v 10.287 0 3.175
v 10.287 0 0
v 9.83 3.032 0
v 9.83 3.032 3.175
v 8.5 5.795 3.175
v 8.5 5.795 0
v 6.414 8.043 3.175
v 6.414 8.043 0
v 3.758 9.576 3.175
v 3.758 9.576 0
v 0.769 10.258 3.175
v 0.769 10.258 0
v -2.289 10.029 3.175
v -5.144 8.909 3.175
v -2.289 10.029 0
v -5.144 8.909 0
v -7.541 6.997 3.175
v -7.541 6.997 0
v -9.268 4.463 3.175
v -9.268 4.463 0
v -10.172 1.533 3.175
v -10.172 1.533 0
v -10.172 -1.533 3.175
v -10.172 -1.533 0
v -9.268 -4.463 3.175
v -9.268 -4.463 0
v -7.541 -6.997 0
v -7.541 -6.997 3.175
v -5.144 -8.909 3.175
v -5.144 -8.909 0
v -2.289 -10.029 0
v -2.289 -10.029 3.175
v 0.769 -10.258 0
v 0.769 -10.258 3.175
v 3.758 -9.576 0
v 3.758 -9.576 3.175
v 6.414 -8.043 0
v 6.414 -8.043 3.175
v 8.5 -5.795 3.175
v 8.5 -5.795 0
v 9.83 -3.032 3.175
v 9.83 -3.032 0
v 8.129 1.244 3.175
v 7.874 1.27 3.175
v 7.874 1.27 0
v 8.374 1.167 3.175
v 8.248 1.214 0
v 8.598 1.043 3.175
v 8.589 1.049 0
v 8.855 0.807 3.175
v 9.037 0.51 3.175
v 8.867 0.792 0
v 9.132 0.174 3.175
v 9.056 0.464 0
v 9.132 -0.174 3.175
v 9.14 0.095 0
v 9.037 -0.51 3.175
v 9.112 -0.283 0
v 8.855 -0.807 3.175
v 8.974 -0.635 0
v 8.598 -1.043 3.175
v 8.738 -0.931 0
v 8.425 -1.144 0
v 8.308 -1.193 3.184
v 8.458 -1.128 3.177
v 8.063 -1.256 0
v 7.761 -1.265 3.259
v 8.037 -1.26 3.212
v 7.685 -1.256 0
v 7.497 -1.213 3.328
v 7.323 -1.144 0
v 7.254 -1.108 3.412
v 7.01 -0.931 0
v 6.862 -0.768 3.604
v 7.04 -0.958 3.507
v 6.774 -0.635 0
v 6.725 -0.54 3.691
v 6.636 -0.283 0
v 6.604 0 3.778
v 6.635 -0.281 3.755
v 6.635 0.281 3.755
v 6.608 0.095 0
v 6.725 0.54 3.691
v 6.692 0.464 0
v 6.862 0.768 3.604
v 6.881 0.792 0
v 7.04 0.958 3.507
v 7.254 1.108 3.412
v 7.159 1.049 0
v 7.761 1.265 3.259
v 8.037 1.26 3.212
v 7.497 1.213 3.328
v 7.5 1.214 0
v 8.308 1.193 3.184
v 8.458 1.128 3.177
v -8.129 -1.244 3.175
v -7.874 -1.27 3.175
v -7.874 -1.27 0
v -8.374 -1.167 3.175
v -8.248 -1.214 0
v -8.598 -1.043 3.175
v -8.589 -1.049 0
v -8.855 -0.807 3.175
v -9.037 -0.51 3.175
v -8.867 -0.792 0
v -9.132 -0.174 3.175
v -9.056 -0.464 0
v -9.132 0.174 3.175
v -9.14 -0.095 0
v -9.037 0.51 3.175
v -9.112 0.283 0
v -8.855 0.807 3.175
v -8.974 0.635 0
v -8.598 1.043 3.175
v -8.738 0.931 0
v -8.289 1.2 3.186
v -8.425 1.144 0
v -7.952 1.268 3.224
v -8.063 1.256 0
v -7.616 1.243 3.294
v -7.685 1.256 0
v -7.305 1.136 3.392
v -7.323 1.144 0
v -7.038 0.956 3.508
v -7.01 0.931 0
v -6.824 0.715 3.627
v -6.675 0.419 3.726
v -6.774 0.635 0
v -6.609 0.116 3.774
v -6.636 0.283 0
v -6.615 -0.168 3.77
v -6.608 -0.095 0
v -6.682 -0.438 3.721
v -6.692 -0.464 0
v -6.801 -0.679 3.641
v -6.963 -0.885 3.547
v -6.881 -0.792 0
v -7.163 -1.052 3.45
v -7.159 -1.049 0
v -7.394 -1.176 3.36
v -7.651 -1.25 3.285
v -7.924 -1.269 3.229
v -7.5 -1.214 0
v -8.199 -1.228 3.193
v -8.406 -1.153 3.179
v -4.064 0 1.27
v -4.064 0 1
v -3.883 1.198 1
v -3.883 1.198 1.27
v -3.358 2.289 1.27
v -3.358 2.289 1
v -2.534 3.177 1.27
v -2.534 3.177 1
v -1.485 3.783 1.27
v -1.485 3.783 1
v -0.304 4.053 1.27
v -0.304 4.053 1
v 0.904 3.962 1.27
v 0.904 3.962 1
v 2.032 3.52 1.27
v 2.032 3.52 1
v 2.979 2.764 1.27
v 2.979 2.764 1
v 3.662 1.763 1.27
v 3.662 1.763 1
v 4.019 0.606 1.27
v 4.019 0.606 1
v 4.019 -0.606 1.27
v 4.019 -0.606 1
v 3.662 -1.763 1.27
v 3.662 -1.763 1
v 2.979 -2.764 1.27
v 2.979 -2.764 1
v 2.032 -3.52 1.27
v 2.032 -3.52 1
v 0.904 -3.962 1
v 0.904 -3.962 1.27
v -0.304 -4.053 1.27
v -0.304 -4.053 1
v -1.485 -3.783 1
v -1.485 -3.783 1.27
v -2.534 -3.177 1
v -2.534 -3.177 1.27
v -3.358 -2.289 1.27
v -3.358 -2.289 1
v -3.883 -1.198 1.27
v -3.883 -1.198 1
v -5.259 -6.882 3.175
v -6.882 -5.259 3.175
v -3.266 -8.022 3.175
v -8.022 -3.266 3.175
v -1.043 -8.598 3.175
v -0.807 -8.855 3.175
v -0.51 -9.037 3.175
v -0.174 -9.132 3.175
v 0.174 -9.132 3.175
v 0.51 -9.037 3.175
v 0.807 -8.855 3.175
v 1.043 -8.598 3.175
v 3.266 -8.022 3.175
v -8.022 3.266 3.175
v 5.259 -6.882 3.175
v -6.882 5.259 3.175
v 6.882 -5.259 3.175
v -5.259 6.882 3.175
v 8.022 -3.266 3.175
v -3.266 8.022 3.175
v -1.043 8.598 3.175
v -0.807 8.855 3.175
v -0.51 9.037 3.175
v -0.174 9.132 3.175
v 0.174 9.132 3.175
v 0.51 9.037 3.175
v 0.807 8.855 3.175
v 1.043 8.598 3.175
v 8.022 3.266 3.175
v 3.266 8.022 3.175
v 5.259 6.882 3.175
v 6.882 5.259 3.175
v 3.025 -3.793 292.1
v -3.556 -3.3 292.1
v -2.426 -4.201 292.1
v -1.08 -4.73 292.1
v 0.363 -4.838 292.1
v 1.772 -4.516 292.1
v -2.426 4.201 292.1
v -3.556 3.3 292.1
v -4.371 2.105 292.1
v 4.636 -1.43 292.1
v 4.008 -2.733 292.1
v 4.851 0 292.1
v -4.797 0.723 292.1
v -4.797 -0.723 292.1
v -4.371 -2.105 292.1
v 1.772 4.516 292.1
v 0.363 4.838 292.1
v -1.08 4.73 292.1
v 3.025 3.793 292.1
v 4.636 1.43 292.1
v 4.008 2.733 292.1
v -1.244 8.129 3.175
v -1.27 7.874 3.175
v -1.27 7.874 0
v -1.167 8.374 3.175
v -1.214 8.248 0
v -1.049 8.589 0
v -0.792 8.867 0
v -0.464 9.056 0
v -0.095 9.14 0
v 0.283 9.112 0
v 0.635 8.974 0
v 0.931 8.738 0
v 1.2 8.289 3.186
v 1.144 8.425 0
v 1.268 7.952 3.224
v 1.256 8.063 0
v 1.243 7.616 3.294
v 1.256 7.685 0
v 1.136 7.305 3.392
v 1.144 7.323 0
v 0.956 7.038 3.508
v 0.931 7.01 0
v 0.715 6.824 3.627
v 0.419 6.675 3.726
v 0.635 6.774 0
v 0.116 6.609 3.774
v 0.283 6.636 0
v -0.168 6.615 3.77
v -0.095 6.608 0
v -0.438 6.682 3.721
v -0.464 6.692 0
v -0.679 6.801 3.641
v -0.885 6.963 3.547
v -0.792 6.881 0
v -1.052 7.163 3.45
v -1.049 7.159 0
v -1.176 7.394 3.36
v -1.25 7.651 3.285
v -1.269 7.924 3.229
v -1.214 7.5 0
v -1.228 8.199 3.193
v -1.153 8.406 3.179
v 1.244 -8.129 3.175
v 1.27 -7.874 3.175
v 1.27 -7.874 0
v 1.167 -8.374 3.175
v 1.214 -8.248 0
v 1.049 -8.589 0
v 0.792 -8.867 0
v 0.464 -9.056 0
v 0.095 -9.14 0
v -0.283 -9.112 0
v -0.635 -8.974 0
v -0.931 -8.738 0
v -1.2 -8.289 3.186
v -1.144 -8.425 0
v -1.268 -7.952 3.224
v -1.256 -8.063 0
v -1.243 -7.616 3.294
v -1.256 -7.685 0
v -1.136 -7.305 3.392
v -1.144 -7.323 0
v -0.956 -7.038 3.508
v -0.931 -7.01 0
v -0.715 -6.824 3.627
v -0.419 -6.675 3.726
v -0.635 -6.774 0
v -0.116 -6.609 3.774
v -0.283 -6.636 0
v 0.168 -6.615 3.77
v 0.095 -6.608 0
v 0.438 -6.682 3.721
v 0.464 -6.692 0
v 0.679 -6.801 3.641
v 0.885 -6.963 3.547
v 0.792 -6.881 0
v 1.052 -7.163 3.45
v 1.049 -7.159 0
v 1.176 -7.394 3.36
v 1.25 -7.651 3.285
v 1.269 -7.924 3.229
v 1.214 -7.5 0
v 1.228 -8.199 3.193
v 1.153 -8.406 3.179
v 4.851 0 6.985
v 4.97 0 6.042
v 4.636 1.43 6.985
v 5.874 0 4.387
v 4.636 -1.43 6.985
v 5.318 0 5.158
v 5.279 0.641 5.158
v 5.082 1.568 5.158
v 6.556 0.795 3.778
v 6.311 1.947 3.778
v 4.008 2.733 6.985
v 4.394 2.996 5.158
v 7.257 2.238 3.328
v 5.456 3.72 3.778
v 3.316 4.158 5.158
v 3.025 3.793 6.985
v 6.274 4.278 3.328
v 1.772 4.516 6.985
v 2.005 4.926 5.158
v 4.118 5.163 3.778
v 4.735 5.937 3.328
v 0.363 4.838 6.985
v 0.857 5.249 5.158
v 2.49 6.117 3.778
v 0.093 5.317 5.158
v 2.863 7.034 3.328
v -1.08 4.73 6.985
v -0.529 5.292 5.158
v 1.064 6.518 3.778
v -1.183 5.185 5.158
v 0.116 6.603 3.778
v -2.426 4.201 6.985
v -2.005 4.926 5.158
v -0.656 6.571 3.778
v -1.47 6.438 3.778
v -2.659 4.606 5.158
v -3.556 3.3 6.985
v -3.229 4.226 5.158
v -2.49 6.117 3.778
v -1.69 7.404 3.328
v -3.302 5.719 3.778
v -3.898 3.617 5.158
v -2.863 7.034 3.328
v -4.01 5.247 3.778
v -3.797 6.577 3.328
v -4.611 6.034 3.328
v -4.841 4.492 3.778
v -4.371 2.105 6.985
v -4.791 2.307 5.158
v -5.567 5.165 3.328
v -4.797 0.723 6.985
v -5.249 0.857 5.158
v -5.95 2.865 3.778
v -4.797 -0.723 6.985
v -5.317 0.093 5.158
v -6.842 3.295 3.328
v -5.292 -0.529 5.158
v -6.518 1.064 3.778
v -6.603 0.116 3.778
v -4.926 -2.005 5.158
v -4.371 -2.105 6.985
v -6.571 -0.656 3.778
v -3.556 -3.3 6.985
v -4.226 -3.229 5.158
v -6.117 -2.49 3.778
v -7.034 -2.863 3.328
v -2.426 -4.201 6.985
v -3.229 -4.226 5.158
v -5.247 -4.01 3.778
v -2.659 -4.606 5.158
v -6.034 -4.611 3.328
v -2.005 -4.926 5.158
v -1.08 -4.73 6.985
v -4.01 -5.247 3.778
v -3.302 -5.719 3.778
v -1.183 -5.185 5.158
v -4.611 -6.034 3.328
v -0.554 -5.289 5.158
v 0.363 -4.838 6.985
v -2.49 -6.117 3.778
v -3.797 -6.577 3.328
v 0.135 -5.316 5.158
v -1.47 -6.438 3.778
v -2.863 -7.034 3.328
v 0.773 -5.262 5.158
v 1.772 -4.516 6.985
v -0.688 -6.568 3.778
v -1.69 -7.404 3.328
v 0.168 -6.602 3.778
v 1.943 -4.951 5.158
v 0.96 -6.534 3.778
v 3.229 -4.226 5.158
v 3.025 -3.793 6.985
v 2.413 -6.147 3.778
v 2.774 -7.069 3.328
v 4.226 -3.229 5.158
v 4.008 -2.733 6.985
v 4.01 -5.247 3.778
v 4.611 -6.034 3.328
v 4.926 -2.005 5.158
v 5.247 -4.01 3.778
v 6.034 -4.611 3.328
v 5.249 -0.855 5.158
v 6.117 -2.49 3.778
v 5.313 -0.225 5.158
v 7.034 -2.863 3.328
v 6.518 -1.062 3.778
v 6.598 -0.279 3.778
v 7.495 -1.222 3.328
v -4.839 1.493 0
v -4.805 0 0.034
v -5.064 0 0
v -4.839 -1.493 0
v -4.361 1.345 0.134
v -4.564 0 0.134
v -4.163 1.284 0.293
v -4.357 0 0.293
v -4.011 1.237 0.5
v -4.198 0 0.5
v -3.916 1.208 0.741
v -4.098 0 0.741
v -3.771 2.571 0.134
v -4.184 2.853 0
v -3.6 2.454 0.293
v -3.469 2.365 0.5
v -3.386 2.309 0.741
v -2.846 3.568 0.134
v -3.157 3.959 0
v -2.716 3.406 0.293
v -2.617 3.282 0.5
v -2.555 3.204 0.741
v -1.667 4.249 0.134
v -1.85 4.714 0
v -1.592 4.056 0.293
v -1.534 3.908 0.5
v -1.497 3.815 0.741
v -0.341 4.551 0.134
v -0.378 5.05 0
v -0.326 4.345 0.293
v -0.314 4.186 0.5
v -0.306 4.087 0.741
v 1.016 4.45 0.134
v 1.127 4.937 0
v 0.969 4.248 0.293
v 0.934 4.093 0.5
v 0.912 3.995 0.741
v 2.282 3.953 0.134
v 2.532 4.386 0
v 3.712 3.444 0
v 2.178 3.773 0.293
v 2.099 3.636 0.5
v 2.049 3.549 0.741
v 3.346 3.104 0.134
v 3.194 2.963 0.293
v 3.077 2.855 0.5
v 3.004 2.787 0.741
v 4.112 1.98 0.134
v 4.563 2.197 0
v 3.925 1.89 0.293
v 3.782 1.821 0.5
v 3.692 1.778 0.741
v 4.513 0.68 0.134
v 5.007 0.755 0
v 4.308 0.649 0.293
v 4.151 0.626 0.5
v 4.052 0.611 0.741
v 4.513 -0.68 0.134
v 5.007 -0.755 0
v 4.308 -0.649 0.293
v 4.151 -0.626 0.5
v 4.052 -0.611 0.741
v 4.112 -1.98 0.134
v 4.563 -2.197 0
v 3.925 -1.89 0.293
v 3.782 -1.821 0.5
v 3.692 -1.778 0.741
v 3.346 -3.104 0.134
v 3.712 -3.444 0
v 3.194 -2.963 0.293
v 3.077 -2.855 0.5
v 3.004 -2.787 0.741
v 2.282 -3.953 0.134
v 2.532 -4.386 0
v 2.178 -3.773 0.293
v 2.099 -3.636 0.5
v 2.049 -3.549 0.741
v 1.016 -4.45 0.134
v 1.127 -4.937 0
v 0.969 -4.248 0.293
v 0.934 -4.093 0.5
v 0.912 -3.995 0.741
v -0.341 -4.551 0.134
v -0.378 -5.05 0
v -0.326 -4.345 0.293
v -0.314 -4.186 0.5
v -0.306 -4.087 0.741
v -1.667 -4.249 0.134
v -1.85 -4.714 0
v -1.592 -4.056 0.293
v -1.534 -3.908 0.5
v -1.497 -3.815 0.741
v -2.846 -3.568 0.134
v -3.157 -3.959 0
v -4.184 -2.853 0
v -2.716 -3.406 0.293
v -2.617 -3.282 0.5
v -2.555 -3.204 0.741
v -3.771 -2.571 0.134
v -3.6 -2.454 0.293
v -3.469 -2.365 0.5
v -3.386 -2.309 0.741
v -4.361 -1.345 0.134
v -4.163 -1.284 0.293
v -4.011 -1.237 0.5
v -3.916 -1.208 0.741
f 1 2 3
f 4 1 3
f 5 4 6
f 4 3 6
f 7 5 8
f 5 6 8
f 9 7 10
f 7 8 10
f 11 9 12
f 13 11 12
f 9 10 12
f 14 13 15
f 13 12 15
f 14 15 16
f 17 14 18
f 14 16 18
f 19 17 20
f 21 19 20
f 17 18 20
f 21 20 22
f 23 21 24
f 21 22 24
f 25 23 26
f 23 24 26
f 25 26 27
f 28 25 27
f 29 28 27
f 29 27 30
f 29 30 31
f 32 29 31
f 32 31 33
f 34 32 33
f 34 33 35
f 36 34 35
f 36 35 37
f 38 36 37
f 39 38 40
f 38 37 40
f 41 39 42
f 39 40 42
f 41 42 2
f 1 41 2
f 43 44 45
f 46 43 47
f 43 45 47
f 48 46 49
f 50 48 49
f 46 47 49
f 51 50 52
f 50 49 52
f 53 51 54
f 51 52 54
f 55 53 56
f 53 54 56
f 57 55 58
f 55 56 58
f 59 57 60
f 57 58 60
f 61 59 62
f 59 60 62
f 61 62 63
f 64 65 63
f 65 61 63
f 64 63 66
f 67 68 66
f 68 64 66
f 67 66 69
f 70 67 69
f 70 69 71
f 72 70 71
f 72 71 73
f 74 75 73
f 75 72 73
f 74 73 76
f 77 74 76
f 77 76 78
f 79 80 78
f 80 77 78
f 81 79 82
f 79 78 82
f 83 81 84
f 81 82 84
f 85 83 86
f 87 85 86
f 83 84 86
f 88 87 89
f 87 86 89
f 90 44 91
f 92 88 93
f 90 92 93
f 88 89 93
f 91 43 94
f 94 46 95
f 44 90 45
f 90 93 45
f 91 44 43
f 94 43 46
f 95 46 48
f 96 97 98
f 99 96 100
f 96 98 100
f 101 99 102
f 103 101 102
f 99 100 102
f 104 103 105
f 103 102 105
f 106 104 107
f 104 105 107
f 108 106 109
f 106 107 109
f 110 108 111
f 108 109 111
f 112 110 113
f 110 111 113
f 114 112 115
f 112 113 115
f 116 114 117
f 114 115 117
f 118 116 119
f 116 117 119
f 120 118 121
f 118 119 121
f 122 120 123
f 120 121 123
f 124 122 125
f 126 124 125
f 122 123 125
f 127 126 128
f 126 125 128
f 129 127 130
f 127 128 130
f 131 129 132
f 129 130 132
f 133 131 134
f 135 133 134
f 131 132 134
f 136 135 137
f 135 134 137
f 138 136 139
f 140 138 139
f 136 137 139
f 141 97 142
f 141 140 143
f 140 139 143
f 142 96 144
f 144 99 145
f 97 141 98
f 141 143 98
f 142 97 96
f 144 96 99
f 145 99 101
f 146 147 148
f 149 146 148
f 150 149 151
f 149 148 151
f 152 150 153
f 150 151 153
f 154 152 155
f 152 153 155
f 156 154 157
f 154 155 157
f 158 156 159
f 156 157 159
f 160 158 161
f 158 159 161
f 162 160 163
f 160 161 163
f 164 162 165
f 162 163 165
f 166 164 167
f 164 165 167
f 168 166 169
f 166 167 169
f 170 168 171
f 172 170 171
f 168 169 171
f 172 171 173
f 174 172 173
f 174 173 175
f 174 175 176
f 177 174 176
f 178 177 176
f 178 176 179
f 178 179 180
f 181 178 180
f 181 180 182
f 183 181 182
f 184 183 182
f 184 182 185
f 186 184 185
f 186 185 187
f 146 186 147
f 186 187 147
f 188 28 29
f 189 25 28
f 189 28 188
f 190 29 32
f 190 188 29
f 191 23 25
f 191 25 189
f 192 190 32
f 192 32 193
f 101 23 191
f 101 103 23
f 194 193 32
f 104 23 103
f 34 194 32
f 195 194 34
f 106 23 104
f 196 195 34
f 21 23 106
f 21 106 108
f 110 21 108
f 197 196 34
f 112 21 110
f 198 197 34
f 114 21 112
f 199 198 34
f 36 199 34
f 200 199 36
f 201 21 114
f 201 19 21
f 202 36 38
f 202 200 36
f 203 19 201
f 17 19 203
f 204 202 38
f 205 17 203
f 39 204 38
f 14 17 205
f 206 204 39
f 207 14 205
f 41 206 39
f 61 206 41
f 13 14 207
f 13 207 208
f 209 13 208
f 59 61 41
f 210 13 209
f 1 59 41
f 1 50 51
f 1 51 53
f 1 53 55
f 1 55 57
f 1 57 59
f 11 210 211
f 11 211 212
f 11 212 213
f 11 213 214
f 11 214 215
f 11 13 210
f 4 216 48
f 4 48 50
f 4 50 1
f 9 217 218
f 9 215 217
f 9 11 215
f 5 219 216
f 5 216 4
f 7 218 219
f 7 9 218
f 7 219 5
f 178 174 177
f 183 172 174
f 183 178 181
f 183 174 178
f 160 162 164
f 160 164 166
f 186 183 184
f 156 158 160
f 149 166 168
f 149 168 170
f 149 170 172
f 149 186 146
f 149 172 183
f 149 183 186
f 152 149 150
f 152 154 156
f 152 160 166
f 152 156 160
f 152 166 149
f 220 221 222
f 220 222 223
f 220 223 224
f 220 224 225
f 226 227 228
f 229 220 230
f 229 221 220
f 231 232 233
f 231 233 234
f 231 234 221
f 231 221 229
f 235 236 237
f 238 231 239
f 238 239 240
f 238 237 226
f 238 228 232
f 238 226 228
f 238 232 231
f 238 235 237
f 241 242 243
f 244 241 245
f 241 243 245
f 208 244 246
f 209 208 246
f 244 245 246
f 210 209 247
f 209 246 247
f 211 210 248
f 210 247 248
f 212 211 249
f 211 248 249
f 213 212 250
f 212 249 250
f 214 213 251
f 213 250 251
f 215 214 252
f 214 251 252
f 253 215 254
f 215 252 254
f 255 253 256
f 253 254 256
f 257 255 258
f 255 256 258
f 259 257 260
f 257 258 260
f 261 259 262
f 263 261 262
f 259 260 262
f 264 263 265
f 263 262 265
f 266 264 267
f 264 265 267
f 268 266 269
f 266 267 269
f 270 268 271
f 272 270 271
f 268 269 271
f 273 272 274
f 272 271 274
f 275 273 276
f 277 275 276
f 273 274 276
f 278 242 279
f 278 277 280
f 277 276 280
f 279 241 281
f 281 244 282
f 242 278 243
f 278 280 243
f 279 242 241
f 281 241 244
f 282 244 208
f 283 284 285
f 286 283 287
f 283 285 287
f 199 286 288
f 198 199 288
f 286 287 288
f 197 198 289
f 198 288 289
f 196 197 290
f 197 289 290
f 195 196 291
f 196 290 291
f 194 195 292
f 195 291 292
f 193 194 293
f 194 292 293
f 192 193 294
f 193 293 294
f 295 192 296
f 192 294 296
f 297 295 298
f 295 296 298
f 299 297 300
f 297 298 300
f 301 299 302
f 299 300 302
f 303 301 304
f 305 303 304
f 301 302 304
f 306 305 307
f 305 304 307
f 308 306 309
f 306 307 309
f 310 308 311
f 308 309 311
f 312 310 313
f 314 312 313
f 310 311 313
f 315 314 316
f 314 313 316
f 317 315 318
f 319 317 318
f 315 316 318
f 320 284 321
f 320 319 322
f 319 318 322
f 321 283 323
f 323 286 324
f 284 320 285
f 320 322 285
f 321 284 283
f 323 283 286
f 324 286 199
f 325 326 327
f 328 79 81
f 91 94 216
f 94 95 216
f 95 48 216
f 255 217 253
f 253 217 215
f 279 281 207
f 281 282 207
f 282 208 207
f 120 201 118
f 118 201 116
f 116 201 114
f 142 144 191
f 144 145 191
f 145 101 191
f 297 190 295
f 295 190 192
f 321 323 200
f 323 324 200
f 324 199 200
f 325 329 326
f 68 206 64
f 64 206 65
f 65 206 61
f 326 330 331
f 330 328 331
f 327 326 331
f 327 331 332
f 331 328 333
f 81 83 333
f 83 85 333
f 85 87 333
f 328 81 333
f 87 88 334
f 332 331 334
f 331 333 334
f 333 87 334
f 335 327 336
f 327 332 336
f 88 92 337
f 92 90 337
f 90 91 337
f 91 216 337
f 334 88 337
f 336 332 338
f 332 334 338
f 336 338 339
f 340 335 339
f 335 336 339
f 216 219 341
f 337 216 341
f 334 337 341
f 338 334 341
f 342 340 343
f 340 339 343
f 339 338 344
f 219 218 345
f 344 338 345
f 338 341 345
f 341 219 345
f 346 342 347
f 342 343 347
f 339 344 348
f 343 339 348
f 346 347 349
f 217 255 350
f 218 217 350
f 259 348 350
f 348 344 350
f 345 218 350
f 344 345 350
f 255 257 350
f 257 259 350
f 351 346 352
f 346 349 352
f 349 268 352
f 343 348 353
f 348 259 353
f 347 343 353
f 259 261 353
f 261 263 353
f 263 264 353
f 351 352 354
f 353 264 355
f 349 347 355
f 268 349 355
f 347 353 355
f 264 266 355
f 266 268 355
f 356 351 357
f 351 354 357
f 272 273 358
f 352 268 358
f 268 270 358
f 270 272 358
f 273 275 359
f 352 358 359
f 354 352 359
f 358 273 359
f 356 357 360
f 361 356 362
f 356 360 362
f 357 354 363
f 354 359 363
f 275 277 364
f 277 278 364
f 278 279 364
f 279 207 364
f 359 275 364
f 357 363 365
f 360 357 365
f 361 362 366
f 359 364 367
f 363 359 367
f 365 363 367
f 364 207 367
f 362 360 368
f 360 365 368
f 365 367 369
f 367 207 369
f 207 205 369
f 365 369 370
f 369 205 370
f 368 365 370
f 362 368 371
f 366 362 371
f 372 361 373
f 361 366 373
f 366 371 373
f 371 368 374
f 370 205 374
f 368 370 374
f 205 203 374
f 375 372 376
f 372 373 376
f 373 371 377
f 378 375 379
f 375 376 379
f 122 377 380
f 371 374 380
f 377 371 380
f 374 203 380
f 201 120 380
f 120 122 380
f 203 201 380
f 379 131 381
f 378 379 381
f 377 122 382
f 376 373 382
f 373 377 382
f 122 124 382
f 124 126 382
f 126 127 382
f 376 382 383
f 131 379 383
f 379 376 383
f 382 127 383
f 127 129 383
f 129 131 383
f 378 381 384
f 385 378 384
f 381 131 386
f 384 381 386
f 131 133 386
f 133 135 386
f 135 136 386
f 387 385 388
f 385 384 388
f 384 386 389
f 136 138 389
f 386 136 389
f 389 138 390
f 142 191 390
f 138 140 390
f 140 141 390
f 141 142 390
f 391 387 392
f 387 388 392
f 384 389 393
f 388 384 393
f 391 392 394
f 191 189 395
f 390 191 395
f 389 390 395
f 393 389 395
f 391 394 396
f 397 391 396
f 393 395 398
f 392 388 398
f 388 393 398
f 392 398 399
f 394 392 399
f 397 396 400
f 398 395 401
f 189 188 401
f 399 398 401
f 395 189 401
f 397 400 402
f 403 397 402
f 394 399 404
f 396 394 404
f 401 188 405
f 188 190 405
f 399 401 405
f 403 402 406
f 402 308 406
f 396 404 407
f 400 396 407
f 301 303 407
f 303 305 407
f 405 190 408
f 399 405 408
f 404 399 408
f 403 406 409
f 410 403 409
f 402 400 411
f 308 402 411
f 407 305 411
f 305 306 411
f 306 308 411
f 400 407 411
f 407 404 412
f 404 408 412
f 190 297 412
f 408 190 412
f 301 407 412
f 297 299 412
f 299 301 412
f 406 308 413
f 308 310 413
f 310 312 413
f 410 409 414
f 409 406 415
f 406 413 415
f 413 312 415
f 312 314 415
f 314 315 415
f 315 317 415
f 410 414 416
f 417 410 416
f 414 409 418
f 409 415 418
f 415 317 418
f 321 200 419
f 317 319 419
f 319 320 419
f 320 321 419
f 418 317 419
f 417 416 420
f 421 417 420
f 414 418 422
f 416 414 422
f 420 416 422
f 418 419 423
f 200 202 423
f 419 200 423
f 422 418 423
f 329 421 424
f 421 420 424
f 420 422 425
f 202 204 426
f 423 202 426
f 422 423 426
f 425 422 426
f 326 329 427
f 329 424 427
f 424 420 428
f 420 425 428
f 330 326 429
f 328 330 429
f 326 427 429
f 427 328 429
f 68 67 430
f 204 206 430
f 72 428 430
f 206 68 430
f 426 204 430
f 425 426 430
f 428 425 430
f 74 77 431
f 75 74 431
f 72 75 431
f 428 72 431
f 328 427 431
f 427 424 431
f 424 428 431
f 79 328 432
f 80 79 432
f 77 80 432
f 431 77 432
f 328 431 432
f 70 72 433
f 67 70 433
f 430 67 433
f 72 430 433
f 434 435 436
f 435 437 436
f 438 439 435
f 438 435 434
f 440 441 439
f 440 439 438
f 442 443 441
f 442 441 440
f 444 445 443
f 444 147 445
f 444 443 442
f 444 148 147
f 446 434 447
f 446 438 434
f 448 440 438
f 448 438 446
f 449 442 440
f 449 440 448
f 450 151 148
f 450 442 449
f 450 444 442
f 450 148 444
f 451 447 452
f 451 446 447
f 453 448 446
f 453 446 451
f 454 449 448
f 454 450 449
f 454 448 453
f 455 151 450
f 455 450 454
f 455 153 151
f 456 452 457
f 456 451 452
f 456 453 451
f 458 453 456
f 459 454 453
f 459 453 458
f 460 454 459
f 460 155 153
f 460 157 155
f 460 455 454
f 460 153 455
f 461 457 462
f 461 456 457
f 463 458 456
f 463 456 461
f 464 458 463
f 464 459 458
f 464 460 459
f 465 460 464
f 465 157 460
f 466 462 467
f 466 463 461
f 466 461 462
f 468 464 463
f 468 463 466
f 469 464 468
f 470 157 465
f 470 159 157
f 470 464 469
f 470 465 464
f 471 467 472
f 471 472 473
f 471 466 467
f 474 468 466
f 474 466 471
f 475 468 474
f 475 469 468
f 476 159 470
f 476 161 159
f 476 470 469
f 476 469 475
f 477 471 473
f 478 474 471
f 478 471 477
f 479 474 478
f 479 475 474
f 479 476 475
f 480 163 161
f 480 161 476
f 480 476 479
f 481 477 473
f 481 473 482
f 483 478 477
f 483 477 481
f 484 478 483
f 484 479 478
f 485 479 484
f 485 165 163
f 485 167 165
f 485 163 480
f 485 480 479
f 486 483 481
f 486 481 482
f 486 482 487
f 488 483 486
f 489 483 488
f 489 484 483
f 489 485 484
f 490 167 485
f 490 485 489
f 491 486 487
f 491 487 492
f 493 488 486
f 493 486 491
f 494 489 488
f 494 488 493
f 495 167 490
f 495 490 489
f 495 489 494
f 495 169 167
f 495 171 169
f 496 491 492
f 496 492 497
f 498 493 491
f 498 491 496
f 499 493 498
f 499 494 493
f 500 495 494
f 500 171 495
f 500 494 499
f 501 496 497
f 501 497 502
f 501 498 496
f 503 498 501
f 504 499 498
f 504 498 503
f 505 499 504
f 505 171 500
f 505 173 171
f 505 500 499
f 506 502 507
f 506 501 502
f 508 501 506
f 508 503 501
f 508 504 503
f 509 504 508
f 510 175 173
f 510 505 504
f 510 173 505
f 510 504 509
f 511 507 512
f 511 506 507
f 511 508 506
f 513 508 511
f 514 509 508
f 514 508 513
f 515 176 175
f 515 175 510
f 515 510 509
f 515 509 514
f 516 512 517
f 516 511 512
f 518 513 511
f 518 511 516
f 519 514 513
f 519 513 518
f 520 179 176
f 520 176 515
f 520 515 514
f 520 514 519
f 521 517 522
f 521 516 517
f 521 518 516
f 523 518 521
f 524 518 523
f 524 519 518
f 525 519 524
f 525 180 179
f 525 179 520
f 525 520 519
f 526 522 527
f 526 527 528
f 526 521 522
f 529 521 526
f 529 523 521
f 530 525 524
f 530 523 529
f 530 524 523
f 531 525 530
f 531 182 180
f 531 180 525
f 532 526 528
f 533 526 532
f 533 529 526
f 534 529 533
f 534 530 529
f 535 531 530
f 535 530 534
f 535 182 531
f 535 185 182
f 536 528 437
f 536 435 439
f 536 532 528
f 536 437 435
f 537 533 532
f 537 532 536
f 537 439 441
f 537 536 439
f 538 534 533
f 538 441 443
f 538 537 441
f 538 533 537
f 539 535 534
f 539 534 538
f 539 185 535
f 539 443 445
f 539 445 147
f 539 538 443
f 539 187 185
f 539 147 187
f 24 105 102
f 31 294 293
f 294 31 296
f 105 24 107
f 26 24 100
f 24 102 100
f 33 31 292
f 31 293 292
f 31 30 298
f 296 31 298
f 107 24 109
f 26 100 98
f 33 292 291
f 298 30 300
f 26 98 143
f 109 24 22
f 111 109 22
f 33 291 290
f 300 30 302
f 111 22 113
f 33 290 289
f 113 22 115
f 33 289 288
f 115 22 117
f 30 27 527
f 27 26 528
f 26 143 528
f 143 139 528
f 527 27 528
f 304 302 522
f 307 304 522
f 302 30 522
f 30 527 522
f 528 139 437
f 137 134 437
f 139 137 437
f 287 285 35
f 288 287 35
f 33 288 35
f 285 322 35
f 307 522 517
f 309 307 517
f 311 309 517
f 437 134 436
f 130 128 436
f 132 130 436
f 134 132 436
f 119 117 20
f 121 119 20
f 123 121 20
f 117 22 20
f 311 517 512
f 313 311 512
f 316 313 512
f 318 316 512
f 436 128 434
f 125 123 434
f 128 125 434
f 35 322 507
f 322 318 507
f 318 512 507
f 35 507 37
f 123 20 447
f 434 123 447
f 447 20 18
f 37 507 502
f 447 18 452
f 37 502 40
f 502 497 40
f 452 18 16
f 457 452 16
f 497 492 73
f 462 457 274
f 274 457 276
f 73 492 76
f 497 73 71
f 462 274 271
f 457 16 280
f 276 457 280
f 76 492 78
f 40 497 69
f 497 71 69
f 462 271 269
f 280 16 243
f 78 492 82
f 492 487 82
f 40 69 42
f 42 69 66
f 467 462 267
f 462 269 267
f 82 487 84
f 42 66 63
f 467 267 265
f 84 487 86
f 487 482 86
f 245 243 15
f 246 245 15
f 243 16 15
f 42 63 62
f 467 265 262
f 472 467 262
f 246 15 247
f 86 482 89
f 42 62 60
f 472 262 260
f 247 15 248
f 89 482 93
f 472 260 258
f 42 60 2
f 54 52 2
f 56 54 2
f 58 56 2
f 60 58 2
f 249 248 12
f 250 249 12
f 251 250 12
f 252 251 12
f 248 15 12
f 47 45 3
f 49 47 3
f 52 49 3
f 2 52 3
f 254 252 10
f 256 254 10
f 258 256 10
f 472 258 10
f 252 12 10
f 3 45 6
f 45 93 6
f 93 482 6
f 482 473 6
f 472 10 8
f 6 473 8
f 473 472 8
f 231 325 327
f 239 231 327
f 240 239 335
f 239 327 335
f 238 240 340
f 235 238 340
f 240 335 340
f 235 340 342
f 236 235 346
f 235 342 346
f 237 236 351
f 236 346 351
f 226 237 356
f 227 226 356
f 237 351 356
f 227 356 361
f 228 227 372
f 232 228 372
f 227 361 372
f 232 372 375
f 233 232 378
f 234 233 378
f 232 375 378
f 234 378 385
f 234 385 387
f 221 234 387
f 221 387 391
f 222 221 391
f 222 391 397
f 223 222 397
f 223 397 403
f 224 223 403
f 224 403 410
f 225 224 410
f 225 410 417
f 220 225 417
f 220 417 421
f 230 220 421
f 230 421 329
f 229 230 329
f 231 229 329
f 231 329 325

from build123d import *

# Parameters (mm, degrees)
SKETCH1_R           = 10.287
BOSS_EXTRUDE1_DEPTH = 3.175
SKETCH2_R           = 4.8514
BOSS_EXTRUDE2_DEPTH = 288.925
SKETCH3_R           = 4.064
CUT_EXTRUDE1_DEPTH  = 1.27
FILLET1_R           = 1.000000032
CUT_EXTRUDE2_REACH  = 294.462
SKETCH4_R           = 1.27
CIRPATTERN1_COUNT   = 4
FILLET2_R           = 3.81


with BuildPart() as part:
    # Sketch1 → Boss-Extrude1 (new body)
    with BuildSketch(Plane.XY):
        Circle(SKETCH1_R)
    extrude(amount=BOSS_EXTRUDE1_DEPTH)

    # Sketch2 → Boss-Extrude2 (add)
    with BuildSketch(Plane.XY.offset(3.175)):
        Circle(SKETCH2_R)
    extrude(amount=BOSS_EXTRUDE2_DEPTH)

    # Sketch3 → Cut-Extrude1 (cut)
    with BuildSketch(Plane(origin=(0, 0, 0), x_dir=(-1, 0, 0), z_dir=(0, 0, -1))):
        Circle(SKETCH3_R)
    extrude(amount=-CUT_EXTRUDE1_DEPTH, mode=Mode.SUBTRACT)

    # Fillet1
    fillet1_edges = [part.edges().sort_by_distance(p)[0] for p in [
        (4.064, 0, 0),
    ]]
    fillet(fillet1_edges, radius=FILLET1_R)

    # Sketch4 → Cut-Extrude2 (cut, up to next)
    with BuildSketch(Plane(origin=(0, 0, 0), x_dir=(-1, 0, 0), z_dir=(0, 0, -1)), mode=Mode.PRIVATE) as cut_extrude2_sk1:
        with Locations((0, 7.874)):
            Circle(SKETCH4_R)
    cut_extrude2_tool1 = extrude(cut_extrude2_sk1.sketch, amount=-CUT_EXTRUDE2_REACH, mode=Mode.PRIVATE) & part.part
    cut_extrude2 = cut_extrude2_tool1.solids().sort_by_distance((0, 7.874, 0))[0]
    add(cut_extrude2, mode=Mode.SUBTRACT)

    # CirPattern1: Cut-Extrude2 ×4 about axis
    cirpattern1_axis = Axis((0, 0, 0), (0, 0, 1))
    for i in range(1, CIRPATTERN1_COUNT):
        add(cut_extrude2.rotate(cirpattern1_axis, i * 360 / CIRPATTERN1_COUNT), mode=Mode.SUBTRACT)

    # Fillet2
    # the kernel refuses this fillet: 3.81 mm, written as the material it adds along each edge
    with BuildSketch(Plane(origin=(0, 0, 3.175), x_dir=(1, 0, 0), z_dir=(0, -1, 0))) as fillet2_piece_1_section:
        with BuildLine():
            CenterArc((4.8514 + FILLET2_R, FILLET2_R), FILLET2_R, 180, 90)
            Line((4.8514, FILLET2_R), (4.8514, 0))
            Line((4.8514, 0), (4.8514 + FILLET2_R, 0))
        make_face()
    fillet2_piece_1 = revolve(axis=Axis((0, 0, 3.175), (0, 0, 1)), mode=Mode.PRIVATE)
    fillet2_piece_1 = fillet2_piece_1 - Plane(origin=(-7.874, 0, 4.25520668), x_dir=(0, -1, 0), z_dir=(0, 0, -1)) * Cylinder(1.27, 35, mode=Mode.PRIVATE)
    fillet2_piece_1 = fillet2_piece_1 - Plane(origin=(0, -7.874, 4.25520668), x_dir=(1, 0, 0), z_dir=(0, 0, -1)) * Cylinder(1.27, 35, mode=Mode.PRIVATE)
    fillet2_piece_1 = fillet2_piece_1 - Plane(origin=(0, 7.874, 4.25520668), x_dir=(-1, 0, 0), z_dir=(0, 0, -1)) * Cylinder(1.27, 35, mode=Mode.PRIVATE)
    fillet2_piece_1 = fillet2_piece_1 - Plane(origin=(7.874, 0, 4.25520668), x_dir=(0, 1, 0), z_dir=(0, 0, -1)) * Cylinder(1.27, 35, mode=Mode.PRIVATE)
    add(fillet2_piece_1)


solid = part.part
